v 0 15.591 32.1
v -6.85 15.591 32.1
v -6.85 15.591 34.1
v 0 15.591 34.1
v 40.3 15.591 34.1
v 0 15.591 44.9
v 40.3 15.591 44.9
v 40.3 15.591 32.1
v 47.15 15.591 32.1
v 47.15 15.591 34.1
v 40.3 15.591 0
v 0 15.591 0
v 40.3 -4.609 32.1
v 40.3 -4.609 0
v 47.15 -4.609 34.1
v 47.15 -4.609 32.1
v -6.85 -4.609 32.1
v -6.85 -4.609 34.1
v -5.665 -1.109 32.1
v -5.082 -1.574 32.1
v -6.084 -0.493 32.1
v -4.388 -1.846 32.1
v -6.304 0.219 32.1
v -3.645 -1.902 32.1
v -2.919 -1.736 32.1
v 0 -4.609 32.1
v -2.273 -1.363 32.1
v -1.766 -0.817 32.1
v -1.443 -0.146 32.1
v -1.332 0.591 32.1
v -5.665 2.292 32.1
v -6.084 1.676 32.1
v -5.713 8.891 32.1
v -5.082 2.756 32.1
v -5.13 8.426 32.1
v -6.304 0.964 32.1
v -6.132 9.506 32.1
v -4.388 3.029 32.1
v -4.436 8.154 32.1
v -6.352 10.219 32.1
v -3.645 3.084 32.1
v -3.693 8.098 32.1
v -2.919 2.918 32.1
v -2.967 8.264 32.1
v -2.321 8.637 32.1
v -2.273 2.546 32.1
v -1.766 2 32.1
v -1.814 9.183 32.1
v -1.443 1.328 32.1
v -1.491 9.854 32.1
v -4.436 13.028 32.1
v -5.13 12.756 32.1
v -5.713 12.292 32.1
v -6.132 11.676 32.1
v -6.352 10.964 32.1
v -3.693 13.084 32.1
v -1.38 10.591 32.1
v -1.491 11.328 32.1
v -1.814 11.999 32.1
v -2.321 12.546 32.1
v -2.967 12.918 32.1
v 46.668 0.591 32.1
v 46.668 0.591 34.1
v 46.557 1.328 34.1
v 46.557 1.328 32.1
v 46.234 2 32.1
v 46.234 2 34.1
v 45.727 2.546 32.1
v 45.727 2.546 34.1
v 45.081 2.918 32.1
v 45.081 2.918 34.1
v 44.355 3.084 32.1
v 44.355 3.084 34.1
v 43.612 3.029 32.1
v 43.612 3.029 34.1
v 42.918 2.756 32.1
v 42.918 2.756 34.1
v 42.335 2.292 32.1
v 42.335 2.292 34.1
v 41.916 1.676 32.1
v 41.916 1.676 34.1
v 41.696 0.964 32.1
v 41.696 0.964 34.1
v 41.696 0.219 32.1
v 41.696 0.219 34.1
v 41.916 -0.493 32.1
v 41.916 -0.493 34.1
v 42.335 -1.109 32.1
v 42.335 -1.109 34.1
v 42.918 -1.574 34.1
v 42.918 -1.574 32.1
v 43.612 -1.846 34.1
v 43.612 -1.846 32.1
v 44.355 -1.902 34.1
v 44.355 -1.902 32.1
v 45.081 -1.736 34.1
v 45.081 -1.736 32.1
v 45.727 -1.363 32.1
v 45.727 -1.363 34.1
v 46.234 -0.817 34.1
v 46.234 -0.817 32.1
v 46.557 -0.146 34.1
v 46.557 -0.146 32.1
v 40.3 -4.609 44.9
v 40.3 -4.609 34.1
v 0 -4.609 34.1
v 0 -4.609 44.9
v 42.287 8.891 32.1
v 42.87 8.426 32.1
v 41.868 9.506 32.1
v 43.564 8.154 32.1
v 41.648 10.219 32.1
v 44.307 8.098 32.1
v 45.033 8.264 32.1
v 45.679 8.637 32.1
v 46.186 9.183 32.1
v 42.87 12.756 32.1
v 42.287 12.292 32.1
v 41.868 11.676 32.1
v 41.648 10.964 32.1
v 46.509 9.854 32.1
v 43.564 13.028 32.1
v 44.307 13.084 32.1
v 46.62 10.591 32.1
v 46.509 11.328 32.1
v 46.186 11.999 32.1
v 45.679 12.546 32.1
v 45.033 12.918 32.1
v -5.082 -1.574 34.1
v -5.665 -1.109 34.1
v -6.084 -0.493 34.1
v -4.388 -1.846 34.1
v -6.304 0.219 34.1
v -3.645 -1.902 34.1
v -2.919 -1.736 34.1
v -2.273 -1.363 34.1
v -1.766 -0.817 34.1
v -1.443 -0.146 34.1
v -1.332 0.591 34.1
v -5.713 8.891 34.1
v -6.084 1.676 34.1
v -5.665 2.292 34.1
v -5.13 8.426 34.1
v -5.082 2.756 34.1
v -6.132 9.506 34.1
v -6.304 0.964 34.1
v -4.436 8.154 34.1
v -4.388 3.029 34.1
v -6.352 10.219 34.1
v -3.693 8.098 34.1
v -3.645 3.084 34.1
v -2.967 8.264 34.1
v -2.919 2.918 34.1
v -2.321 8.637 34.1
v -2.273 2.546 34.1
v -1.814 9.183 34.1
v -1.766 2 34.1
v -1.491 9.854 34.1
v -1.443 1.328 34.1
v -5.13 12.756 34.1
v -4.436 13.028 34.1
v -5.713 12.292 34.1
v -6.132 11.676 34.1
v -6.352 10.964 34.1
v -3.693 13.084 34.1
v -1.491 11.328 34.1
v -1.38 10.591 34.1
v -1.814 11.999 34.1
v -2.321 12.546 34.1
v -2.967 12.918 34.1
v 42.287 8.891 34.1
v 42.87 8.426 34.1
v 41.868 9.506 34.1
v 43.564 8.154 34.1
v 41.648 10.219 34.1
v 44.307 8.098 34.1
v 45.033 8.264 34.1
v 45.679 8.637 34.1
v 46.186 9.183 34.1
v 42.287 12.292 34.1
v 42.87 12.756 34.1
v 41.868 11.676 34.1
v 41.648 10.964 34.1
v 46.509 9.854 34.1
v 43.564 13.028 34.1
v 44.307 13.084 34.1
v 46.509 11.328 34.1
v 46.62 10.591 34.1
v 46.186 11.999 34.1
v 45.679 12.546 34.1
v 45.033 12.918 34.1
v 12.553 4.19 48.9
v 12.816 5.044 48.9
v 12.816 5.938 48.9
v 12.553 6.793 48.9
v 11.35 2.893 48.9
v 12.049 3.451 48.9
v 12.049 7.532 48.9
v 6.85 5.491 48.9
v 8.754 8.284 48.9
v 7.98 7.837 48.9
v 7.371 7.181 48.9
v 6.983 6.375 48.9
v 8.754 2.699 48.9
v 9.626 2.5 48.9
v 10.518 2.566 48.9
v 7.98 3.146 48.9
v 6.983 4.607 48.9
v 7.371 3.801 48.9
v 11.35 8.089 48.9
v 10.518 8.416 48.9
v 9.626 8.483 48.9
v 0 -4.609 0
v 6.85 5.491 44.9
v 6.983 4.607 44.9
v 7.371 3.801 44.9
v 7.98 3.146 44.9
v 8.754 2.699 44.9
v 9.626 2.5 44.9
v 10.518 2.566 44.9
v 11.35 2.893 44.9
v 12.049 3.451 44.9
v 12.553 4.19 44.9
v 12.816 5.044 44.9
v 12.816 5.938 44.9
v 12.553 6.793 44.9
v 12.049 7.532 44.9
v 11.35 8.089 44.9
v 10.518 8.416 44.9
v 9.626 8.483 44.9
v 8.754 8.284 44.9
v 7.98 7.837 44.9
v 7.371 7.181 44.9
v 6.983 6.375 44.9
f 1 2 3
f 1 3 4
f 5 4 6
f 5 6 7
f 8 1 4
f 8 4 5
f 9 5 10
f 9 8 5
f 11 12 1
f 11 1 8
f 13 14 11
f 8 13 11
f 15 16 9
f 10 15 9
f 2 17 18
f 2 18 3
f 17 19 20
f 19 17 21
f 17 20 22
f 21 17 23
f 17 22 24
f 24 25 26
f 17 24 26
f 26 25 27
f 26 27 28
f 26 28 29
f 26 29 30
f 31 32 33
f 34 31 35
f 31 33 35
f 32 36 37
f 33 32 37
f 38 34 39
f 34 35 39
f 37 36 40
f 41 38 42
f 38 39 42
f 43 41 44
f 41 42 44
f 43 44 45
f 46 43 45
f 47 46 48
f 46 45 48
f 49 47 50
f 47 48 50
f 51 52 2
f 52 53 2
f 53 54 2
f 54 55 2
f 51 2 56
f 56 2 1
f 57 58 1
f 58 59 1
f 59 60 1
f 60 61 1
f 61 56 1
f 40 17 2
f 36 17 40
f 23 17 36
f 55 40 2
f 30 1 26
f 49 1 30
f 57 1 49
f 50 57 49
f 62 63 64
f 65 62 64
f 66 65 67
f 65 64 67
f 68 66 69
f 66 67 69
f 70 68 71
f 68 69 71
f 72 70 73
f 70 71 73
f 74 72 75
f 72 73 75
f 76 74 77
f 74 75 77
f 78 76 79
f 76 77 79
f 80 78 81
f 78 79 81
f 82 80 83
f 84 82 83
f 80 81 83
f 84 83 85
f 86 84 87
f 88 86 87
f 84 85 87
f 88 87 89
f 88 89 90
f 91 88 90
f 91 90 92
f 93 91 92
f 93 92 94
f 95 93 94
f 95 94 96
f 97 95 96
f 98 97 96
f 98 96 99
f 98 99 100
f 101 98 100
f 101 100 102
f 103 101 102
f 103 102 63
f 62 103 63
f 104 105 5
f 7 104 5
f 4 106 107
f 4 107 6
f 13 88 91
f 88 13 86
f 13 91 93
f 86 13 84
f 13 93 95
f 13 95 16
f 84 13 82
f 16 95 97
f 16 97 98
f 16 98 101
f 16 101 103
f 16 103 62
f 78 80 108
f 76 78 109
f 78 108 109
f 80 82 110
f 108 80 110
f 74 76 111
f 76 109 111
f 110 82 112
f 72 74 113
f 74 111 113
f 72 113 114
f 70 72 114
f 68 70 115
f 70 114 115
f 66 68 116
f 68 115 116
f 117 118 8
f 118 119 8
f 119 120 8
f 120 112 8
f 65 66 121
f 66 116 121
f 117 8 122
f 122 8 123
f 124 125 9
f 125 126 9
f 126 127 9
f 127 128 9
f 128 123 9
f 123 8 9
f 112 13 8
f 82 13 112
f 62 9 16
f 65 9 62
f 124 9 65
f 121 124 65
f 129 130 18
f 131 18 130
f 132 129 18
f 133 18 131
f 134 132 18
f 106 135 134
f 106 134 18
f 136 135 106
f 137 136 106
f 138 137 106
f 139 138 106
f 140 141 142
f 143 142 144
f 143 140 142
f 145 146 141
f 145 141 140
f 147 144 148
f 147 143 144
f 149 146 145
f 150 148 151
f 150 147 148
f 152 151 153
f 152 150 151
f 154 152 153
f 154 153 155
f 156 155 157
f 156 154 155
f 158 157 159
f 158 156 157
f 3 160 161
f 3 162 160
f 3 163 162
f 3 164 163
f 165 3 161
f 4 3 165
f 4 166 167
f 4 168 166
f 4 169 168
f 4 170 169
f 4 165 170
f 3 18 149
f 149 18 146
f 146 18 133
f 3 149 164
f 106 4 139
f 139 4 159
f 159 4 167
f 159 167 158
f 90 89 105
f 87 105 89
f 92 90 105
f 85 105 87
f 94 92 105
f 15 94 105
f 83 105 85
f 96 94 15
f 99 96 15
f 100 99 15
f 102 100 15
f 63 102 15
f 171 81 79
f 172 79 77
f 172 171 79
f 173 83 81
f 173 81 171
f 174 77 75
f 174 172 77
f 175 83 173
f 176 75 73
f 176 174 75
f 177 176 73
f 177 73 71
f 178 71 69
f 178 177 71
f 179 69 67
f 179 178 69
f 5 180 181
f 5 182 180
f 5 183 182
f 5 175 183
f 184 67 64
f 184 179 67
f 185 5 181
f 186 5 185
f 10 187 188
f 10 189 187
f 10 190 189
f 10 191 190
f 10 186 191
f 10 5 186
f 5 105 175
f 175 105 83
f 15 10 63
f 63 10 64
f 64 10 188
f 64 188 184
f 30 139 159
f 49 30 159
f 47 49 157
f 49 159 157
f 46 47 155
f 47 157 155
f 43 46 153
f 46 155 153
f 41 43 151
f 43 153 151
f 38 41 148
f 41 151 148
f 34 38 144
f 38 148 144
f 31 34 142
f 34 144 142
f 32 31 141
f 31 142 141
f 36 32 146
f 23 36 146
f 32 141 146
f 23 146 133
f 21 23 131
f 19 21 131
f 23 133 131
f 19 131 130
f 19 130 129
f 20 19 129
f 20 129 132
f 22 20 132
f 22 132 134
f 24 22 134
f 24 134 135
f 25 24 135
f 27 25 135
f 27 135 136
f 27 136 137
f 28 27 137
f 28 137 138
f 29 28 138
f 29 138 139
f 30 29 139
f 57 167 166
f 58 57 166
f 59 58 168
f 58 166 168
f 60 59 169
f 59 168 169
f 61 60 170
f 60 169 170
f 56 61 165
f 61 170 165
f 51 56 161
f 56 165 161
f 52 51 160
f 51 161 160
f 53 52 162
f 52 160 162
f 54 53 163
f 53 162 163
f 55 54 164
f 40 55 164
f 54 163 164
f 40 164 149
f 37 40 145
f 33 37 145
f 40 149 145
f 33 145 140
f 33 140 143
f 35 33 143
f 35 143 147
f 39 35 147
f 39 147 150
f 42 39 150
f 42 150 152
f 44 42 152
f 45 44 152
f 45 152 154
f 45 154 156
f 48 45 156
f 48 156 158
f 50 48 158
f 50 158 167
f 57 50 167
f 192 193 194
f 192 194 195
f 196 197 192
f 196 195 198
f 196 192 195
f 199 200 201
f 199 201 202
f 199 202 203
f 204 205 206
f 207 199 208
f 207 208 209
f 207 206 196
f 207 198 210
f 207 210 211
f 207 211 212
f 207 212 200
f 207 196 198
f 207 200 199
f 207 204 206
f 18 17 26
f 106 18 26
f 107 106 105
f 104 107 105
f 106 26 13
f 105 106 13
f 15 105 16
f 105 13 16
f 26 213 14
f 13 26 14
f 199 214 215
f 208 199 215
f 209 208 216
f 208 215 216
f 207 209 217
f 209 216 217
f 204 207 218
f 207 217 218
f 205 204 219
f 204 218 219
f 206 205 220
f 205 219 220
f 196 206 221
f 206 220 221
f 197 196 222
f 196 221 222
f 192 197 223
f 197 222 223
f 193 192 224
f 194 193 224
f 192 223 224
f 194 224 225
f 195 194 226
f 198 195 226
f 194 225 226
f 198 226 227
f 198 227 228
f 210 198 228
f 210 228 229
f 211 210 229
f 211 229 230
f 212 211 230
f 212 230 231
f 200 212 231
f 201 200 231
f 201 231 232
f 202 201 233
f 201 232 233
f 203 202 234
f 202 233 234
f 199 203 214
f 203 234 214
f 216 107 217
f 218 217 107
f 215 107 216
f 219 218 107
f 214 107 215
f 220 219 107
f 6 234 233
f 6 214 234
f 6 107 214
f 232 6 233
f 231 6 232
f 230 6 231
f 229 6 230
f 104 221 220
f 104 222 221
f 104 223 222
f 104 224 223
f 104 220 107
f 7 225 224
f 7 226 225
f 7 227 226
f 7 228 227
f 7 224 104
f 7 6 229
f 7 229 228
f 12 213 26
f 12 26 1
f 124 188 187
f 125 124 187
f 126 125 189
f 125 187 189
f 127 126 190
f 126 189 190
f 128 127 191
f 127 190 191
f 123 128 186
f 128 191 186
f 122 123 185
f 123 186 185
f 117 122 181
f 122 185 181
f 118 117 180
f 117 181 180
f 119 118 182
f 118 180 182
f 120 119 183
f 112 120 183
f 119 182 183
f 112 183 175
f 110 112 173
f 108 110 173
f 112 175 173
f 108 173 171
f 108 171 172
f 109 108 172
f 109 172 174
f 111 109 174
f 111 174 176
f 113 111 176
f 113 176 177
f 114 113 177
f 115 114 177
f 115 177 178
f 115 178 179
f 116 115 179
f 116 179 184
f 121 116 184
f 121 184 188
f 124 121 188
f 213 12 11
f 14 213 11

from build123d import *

# Parameters (mm, degrees)
ESQUISSE1_W             = 40.3
ESQUISSE1_H             = 20.2
BOSS_EXTRU_1_DEPTH      = 32.1
ESQUISSE2_W             = 54
ESQUISSE2_H             = 20.2
BOSS_EXTRU_2_DEPTH      = 2
ESQUISSE3_W             = 40.3
ESQUISSE3_H             = 20.2
BOSS_EXTRU_3_DEPTH      = 10.8
ESQUISSE4_R             = 3
BOSS_EXTRU_4_DEPTH      = 4
ESQUISSE5_R             = 2.5
ENL_V_MAT_EXTRU_1_DEPTH = 4


with BuildPart() as part:
    # Esquisse1 → Boss.-Extru.1 (new body)
    with BuildSketch(Plane.XY):
        with Locations((20.15, 5.491176471)):
            Rectangle(ESQUISSE1_W, ESQUISSE1_H)
    extrude(amount=BOSS_EXTRU_1_DEPTH)

    # Esquisse2 → Boss.-Extru.2 (add)
    with BuildSketch(Plane.XY.offset(32.1)):
        with Locations((20.15, 5.491176471)):
            Rectangle(ESQUISSE2_W, ESQUISSE2_H)
    extrude(amount=BOSS_EXTRU_2_DEPTH)

    # Esquisse3 → Boss.-Extru.3 (add)
    with BuildSketch(Plane.XY.offset(34.1)):
        with Locations((20.15, 5.491176471)):
            Rectangle(ESQUISSE3_W, ESQUISSE3_H)
    extrude(amount=BOSS_EXTRU_3_DEPTH)

    # Esquisse4 → Boss.-Extru.4 (add)
    with BuildSketch(Plane.XY.offset(44.9)):
        with Locations(Location((9.85, 5.491176471, 0), (0, 0, 180))):
            Circle(ESQUISSE4_R)
    extrude(amount=BOSS_EXTRU_4_DEPTH)

    # Esquisse5 → Enlèv. mat.-Extru.1 (cut)
    with BuildSketch(Plane.XY.offset(34.1)):
        with Locations((-3.88, 10.591176471)):
            Circle(ESQUISSE5_R)
        with Locations((-3.832055369, 0.591291406)):
            Circle(ESQUISSE5_R)
        with Locations((44.12, 10.591176471)):
            Circle(ESQUISSE5_R)
        with Locations((44.167944631, 0.591291406)):
            Circle(ESQUISSE5_R)
    extrude(amount=-ENL_V_MAT_EXTRU_1_DEPTH, mode=Mode.SUBTRACT)


solid = part.part
